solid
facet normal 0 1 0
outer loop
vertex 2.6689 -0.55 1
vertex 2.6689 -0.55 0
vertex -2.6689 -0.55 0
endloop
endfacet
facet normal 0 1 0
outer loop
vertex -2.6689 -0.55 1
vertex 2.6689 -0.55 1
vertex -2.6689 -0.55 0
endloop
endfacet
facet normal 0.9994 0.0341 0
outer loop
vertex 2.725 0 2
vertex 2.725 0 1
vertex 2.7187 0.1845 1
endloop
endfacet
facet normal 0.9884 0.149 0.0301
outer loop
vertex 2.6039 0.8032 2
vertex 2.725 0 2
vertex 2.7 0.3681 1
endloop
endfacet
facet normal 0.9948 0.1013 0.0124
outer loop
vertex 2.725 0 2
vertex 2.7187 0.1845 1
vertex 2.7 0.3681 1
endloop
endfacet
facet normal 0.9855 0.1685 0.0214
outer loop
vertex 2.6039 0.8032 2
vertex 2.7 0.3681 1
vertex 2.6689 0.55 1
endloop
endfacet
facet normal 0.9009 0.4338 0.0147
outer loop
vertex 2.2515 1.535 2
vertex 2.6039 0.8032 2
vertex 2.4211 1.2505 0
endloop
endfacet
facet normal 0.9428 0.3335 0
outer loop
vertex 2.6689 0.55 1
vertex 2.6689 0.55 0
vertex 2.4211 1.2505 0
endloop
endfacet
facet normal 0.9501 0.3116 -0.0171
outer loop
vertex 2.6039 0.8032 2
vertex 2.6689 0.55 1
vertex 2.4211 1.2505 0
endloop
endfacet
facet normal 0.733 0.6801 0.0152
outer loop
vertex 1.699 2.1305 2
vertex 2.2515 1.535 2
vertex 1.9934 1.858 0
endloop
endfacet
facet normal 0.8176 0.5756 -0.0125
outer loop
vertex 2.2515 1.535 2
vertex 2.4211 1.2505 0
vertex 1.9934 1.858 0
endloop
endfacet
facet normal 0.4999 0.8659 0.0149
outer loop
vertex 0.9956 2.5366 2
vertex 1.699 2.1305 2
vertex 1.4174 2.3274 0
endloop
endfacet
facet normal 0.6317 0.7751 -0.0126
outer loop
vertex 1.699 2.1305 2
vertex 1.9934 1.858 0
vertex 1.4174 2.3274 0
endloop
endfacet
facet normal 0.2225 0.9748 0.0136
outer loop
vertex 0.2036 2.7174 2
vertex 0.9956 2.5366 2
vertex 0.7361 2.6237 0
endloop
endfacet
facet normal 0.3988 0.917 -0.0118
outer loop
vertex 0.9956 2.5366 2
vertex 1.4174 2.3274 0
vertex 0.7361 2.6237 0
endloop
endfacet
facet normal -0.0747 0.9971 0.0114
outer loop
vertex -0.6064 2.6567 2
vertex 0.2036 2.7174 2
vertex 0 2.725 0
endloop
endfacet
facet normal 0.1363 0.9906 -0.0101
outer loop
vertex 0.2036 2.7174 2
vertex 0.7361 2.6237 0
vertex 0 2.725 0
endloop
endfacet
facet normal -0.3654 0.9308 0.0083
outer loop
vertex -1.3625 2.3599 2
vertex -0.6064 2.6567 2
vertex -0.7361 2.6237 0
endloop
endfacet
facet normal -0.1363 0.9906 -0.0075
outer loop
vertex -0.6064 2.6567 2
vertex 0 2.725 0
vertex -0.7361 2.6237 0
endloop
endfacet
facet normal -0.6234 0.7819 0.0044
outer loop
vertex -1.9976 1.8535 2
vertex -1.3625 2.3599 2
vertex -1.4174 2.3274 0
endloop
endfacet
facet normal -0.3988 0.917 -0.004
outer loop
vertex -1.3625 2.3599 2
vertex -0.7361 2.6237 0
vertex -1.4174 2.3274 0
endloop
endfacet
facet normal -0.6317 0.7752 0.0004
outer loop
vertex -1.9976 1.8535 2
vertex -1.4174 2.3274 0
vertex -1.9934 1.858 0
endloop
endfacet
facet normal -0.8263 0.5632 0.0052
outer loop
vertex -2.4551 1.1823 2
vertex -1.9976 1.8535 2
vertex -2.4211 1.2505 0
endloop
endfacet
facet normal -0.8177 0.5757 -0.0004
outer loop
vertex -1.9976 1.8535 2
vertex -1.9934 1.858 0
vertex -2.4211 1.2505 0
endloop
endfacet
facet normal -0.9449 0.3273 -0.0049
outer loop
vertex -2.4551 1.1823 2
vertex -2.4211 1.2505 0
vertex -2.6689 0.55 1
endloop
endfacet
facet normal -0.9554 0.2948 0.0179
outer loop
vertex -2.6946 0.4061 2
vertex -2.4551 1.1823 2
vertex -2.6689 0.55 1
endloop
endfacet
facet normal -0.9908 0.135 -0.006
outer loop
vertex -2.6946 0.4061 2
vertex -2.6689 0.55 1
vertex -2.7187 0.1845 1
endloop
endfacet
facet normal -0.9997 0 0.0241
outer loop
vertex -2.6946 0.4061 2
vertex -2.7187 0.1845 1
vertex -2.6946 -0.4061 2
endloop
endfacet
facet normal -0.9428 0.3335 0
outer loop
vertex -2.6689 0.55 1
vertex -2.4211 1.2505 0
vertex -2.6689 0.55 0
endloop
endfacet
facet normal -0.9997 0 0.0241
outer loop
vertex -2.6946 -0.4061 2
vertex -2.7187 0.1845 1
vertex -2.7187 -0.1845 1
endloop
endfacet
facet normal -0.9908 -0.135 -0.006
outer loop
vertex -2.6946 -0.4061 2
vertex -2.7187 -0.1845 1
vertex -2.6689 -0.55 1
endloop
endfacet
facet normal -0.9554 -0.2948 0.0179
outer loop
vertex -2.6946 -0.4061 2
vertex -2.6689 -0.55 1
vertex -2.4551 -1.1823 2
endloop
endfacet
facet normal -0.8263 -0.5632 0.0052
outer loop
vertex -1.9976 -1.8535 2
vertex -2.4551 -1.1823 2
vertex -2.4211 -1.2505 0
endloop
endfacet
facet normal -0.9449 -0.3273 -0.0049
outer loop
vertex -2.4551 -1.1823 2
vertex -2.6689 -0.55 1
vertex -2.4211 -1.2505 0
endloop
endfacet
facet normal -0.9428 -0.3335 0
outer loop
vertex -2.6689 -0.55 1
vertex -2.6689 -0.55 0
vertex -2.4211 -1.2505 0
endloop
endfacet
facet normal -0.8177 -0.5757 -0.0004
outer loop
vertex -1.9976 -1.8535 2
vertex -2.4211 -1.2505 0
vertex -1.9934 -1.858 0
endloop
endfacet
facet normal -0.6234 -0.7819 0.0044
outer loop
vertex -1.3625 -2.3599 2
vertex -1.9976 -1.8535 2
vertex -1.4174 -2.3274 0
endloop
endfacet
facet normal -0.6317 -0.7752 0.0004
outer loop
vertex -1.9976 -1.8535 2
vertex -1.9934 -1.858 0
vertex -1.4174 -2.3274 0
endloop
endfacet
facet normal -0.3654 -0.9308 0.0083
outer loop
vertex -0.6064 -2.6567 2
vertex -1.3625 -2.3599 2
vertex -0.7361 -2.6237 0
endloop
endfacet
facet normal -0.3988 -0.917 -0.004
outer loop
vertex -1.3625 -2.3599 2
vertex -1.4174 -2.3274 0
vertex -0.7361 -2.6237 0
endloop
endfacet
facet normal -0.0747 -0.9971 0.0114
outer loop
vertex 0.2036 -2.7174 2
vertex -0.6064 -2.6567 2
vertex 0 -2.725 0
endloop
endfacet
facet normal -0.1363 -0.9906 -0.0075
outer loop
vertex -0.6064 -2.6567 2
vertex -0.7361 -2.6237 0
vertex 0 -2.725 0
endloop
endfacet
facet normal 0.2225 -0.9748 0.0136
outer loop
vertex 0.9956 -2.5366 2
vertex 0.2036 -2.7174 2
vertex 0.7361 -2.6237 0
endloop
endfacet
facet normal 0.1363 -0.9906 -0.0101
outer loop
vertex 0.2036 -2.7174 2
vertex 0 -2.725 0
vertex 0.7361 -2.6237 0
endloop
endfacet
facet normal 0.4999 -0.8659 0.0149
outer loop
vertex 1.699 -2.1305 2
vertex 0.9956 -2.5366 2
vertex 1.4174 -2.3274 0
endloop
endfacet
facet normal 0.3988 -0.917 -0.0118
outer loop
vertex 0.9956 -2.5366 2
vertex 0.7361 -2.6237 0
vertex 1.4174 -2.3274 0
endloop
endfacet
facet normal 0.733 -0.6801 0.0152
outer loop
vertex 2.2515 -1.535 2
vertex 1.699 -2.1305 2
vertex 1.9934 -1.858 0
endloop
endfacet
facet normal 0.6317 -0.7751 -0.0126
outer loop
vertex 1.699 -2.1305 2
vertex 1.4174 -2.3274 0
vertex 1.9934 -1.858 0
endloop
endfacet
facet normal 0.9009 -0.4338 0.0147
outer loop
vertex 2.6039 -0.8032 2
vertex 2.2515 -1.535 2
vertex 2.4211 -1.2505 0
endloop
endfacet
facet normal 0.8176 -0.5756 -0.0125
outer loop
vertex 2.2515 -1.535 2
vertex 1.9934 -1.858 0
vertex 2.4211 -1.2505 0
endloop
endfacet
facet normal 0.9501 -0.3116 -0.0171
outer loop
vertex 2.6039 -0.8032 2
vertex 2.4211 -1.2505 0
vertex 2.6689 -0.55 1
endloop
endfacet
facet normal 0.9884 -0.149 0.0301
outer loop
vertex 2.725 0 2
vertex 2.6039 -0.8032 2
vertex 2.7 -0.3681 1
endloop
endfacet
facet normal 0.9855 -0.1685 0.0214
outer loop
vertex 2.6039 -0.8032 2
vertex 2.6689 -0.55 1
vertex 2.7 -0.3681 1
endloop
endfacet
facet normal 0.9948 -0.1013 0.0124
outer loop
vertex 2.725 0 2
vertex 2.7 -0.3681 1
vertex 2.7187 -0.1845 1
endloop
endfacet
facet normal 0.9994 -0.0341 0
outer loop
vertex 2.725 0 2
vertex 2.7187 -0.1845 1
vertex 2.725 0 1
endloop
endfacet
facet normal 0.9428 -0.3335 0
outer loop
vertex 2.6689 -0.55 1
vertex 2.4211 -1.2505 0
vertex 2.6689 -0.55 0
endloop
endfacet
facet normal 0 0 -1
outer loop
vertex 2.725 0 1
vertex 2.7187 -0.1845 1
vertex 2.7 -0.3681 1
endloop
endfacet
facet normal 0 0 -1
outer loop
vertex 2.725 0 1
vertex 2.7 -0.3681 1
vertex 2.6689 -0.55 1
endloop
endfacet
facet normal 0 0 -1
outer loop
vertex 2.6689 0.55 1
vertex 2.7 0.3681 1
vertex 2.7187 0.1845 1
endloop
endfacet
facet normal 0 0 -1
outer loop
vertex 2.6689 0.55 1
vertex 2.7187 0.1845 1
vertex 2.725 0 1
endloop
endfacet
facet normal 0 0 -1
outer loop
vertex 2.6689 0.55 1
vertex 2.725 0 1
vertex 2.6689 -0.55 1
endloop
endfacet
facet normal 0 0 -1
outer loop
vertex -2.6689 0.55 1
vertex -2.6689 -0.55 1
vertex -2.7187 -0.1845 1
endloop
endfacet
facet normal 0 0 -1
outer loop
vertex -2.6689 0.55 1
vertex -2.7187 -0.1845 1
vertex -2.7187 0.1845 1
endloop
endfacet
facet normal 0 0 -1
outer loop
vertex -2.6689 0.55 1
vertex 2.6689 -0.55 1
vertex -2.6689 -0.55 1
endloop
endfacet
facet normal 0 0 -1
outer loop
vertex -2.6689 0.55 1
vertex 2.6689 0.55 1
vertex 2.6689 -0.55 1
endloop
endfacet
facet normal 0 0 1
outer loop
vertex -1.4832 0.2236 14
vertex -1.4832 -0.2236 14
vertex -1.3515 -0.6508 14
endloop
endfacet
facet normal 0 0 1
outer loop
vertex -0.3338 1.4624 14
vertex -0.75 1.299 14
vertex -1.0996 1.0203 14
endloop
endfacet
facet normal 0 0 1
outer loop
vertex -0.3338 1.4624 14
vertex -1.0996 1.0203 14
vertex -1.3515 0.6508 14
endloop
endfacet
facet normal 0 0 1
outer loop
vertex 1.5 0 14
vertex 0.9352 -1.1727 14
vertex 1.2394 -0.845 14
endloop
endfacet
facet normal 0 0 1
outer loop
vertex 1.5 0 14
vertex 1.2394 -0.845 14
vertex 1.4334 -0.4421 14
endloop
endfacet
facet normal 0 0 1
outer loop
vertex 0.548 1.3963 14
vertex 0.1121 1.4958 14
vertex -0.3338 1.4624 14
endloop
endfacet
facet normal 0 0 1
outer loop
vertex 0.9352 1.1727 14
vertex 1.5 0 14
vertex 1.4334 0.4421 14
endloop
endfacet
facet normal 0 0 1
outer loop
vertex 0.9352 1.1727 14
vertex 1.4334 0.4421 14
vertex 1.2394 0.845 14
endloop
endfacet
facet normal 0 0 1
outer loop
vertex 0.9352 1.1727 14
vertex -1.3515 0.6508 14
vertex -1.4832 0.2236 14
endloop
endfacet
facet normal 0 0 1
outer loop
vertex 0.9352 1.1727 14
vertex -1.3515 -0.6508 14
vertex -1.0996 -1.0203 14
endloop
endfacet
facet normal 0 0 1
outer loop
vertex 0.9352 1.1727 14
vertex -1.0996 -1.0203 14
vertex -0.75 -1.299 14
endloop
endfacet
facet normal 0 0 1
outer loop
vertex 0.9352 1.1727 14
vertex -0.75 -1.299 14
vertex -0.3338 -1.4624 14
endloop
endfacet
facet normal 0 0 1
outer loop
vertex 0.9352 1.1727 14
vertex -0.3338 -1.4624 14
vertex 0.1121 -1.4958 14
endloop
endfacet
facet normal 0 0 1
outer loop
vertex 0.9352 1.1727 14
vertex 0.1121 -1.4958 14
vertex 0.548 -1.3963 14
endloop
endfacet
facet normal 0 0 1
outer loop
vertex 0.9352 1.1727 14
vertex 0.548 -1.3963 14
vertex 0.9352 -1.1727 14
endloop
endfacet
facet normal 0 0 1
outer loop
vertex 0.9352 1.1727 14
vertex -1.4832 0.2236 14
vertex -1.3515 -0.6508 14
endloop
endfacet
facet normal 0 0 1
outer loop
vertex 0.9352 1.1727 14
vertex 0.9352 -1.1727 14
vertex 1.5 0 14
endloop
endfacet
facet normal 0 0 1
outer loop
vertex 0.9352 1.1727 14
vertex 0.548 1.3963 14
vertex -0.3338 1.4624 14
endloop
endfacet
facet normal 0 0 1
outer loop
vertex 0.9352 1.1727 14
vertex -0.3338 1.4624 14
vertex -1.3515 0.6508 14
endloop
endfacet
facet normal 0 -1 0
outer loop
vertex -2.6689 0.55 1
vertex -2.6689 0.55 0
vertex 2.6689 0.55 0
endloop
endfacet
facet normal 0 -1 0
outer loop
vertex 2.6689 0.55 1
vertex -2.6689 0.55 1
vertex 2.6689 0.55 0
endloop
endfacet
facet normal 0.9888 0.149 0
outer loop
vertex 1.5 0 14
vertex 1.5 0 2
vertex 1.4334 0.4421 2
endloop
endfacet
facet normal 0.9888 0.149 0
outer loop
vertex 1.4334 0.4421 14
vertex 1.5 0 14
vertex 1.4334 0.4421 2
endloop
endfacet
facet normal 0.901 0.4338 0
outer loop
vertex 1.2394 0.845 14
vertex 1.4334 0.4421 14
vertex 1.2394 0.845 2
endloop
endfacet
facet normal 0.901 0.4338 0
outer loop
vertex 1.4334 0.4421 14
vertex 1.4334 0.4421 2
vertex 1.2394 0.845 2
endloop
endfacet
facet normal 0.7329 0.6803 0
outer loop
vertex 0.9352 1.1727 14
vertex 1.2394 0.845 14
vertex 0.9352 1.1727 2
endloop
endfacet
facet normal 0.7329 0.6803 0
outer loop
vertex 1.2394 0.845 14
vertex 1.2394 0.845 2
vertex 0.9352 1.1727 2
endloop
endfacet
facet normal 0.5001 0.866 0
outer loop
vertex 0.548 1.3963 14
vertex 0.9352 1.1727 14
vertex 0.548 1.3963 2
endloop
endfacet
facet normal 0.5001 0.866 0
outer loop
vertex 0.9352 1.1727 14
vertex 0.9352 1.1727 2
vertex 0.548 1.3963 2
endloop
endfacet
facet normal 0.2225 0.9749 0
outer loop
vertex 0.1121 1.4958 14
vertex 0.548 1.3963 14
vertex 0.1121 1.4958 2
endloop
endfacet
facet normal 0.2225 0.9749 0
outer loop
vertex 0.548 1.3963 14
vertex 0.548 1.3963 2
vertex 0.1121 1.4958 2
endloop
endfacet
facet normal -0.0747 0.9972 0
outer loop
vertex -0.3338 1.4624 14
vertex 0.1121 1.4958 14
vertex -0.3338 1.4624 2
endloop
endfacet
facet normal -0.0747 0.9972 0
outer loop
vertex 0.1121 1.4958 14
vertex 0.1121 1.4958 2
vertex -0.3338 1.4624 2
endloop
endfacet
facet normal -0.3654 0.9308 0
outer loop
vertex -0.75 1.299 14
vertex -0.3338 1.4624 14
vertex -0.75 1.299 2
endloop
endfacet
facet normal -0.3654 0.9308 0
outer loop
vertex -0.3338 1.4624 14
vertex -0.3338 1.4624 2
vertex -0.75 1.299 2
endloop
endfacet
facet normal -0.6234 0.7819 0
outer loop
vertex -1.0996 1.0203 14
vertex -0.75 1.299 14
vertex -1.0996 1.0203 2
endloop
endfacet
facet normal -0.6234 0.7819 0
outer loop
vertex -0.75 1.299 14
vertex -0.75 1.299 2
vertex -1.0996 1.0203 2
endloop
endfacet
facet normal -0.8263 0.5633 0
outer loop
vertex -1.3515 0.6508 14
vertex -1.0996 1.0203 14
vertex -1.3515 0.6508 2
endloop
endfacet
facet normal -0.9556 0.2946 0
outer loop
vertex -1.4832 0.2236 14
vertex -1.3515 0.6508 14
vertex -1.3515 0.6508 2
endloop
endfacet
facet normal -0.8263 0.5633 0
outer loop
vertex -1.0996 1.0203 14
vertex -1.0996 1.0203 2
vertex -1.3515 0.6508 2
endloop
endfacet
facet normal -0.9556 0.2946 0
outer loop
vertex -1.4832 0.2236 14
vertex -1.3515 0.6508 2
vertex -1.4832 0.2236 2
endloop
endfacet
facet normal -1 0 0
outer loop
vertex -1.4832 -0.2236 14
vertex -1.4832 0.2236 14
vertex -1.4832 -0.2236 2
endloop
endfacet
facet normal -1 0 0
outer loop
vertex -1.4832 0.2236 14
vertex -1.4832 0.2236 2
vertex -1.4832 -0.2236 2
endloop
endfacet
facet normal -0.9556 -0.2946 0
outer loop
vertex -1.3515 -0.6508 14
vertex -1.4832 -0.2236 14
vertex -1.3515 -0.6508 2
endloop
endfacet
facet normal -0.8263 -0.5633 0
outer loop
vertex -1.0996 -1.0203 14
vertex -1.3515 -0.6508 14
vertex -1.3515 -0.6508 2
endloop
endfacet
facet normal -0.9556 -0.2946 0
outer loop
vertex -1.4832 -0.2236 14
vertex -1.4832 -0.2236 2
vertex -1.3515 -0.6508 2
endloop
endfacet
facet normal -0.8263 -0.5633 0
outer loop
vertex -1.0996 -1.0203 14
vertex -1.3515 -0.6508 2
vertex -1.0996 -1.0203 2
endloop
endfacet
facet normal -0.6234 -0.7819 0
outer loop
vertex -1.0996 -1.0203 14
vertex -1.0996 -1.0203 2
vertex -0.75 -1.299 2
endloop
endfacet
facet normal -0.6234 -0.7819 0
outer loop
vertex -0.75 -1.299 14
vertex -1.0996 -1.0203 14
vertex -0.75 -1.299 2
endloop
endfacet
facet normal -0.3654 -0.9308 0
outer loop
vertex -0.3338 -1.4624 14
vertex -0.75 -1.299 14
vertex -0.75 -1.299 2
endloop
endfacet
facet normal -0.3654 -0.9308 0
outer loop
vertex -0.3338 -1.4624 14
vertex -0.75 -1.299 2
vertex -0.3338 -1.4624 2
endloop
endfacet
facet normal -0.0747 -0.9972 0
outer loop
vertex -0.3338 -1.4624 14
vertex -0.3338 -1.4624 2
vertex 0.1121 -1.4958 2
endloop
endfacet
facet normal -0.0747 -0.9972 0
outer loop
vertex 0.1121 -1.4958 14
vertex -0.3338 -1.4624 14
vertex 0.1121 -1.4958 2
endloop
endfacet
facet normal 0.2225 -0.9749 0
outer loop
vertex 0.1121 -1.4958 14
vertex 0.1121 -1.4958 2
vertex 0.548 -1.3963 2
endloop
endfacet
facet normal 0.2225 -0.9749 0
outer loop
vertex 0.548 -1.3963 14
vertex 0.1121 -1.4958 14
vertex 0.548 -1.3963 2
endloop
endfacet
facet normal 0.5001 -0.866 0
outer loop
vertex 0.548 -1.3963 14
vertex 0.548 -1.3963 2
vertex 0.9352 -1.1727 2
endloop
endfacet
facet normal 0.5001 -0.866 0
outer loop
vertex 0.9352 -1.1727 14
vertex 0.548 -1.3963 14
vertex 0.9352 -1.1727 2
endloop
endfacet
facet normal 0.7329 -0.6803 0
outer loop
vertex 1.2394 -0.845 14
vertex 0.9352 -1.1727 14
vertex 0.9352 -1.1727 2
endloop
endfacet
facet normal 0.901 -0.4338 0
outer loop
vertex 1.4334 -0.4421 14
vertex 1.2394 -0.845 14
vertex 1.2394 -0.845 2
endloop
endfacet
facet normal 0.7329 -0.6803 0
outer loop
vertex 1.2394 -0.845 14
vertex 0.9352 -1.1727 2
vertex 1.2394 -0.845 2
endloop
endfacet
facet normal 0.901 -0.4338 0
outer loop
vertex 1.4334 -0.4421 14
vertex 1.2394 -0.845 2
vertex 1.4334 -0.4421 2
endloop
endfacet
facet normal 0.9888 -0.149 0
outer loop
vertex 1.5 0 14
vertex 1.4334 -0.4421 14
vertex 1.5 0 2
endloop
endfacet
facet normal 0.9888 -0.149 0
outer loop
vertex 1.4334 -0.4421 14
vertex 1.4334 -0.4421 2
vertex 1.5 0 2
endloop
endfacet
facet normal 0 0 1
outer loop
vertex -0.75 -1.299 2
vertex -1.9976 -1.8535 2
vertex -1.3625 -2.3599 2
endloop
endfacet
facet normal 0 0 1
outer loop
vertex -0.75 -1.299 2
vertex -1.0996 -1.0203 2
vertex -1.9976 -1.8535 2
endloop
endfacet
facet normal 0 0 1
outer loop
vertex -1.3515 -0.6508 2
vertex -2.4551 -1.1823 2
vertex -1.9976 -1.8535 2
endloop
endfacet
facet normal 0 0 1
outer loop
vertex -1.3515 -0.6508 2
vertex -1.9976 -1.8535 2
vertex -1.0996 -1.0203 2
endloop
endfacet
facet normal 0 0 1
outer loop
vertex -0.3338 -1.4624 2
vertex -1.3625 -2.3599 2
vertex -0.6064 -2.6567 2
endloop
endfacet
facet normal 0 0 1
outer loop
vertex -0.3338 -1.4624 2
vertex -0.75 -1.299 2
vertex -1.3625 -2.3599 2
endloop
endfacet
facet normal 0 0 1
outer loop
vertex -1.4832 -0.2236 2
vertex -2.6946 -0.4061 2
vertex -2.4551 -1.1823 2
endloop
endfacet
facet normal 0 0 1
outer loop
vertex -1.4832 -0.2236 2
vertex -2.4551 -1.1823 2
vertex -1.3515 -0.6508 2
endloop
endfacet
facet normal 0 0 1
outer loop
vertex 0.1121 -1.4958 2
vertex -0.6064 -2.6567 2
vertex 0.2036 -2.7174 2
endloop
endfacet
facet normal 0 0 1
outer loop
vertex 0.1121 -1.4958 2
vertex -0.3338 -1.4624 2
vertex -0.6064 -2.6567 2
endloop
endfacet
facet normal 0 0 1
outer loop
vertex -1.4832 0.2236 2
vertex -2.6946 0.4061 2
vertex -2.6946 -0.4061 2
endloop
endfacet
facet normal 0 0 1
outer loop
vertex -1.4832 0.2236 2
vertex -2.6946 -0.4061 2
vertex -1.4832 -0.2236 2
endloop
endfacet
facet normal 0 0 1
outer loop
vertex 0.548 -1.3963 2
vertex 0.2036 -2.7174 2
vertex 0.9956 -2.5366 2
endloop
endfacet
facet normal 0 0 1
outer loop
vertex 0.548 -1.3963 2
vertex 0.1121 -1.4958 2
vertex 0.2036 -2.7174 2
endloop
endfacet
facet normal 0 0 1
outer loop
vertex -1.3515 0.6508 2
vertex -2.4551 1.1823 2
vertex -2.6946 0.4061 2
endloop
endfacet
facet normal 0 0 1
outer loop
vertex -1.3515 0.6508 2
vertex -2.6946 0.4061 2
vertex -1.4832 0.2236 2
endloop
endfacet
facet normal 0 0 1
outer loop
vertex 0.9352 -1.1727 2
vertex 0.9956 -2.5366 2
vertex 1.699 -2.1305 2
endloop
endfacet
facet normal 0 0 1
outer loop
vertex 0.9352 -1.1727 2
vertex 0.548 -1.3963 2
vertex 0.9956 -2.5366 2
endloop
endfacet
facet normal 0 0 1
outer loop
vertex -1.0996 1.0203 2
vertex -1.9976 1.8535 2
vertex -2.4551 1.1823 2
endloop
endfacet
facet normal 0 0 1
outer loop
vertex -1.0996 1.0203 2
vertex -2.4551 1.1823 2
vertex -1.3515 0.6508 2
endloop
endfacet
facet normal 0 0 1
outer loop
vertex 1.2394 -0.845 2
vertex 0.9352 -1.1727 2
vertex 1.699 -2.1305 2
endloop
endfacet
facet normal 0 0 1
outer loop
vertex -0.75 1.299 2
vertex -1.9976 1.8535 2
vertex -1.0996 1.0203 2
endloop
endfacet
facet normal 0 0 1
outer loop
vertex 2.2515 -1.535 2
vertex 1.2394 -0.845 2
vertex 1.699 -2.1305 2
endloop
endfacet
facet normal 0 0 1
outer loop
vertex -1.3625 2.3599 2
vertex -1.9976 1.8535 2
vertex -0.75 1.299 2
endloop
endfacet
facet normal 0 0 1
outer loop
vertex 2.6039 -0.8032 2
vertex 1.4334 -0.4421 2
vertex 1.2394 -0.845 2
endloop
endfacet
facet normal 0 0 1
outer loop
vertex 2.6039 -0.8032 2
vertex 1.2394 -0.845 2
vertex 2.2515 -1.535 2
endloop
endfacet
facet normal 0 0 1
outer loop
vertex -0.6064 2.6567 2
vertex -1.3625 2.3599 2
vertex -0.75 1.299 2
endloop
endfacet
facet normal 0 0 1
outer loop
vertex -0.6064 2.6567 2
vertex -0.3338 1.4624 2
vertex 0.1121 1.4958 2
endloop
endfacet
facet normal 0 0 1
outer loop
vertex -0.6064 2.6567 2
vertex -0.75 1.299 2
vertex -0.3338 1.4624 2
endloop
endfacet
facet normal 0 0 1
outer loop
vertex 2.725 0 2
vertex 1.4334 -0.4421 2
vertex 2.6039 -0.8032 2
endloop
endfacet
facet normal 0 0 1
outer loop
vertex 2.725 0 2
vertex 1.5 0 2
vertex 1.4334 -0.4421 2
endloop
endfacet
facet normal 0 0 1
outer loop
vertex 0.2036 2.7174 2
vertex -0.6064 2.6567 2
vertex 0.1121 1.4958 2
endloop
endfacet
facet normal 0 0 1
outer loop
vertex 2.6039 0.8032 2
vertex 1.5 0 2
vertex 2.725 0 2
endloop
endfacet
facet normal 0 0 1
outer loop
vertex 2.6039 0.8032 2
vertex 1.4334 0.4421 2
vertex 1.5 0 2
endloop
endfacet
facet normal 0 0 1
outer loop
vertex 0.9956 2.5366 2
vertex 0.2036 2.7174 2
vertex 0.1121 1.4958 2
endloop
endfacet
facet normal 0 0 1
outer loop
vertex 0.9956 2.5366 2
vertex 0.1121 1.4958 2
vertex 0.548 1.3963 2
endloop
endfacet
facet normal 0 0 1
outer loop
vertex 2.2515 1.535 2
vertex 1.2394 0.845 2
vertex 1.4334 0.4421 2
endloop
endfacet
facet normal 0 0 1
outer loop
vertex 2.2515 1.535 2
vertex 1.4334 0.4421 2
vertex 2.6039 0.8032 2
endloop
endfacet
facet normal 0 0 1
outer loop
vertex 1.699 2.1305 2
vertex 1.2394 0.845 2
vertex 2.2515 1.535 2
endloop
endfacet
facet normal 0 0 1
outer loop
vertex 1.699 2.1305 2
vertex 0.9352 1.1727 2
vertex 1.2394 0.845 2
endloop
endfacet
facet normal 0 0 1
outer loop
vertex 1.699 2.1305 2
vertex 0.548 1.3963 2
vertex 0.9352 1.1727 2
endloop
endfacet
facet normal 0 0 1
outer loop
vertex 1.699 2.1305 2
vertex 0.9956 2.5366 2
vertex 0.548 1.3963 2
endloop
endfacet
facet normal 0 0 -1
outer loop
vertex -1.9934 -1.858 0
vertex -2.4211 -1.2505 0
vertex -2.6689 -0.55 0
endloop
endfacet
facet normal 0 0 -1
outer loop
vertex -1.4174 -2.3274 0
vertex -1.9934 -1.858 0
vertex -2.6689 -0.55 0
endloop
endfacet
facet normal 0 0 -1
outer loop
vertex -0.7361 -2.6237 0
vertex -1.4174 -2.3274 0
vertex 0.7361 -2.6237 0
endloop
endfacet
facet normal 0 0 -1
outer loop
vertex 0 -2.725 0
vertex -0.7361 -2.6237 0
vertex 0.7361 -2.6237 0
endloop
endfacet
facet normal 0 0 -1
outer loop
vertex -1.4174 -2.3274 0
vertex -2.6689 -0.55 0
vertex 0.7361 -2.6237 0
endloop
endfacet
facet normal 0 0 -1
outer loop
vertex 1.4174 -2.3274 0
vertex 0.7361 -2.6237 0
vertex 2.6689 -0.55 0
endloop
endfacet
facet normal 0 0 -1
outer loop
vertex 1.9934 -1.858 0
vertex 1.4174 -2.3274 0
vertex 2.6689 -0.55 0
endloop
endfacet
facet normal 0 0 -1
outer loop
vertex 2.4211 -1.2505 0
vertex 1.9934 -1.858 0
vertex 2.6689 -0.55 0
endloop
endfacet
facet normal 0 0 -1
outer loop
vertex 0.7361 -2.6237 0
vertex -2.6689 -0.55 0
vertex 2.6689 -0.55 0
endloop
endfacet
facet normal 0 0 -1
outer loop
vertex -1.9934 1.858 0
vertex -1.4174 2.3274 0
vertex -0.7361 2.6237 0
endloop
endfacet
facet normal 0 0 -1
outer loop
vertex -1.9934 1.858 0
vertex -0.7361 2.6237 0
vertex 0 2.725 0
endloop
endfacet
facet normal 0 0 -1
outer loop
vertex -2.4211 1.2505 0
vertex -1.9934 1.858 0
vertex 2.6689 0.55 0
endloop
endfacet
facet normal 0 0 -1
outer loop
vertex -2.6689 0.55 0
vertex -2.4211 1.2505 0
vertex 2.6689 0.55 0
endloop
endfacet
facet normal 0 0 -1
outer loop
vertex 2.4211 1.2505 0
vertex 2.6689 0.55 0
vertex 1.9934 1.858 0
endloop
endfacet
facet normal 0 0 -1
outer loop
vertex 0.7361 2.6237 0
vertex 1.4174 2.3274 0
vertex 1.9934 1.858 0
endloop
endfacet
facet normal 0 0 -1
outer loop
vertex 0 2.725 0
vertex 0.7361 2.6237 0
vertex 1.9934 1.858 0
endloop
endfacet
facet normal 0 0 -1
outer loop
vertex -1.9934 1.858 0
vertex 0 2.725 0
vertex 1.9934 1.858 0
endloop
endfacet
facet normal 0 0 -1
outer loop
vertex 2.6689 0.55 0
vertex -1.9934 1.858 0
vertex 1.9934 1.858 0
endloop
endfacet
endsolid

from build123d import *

# Parameters (mm, degrees)
SKETCH1_R          = 2.725
EXTRUDE1_DEPTH     = 2
CUT_EXTRUDE1_DEPTH = 1
SKETCH3_R          = 1.5
EXTRUDE2_DEPTH     = 12


with BuildPart() as part:
    # Sketch1 → Extrude1 (new body)
    with BuildSketch(Plane.XY):
        Circle(SKETCH1_R)
    extrude(amount=EXTRUDE1_DEPTH)

    # Sketch2 → Cut-Extrude1 (cut)
    with BuildSketch(Plane(origin=(0, 0, 0), x_dir=(-1, 0, 0), z_dir=(0, 0, -1))):
        Polygon((3.449801909, 0), (3.449801909, 0.55), (-3.901269584, 0.55), (-3.901269584, -0.55), (3.449801909, -0.55), align=None)
    extrude(amount=-CUT_EXTRUDE1_DEPTH, mode=Mode.SUBTRACT)

    # Sketch3 → Extrude2 (add)
    with BuildSketch(Plane.XY.offset(2)):
        Circle(SKETCH3_R)
    extrude(amount=EXTRUDE2_DEPTH)


solid = part.part
